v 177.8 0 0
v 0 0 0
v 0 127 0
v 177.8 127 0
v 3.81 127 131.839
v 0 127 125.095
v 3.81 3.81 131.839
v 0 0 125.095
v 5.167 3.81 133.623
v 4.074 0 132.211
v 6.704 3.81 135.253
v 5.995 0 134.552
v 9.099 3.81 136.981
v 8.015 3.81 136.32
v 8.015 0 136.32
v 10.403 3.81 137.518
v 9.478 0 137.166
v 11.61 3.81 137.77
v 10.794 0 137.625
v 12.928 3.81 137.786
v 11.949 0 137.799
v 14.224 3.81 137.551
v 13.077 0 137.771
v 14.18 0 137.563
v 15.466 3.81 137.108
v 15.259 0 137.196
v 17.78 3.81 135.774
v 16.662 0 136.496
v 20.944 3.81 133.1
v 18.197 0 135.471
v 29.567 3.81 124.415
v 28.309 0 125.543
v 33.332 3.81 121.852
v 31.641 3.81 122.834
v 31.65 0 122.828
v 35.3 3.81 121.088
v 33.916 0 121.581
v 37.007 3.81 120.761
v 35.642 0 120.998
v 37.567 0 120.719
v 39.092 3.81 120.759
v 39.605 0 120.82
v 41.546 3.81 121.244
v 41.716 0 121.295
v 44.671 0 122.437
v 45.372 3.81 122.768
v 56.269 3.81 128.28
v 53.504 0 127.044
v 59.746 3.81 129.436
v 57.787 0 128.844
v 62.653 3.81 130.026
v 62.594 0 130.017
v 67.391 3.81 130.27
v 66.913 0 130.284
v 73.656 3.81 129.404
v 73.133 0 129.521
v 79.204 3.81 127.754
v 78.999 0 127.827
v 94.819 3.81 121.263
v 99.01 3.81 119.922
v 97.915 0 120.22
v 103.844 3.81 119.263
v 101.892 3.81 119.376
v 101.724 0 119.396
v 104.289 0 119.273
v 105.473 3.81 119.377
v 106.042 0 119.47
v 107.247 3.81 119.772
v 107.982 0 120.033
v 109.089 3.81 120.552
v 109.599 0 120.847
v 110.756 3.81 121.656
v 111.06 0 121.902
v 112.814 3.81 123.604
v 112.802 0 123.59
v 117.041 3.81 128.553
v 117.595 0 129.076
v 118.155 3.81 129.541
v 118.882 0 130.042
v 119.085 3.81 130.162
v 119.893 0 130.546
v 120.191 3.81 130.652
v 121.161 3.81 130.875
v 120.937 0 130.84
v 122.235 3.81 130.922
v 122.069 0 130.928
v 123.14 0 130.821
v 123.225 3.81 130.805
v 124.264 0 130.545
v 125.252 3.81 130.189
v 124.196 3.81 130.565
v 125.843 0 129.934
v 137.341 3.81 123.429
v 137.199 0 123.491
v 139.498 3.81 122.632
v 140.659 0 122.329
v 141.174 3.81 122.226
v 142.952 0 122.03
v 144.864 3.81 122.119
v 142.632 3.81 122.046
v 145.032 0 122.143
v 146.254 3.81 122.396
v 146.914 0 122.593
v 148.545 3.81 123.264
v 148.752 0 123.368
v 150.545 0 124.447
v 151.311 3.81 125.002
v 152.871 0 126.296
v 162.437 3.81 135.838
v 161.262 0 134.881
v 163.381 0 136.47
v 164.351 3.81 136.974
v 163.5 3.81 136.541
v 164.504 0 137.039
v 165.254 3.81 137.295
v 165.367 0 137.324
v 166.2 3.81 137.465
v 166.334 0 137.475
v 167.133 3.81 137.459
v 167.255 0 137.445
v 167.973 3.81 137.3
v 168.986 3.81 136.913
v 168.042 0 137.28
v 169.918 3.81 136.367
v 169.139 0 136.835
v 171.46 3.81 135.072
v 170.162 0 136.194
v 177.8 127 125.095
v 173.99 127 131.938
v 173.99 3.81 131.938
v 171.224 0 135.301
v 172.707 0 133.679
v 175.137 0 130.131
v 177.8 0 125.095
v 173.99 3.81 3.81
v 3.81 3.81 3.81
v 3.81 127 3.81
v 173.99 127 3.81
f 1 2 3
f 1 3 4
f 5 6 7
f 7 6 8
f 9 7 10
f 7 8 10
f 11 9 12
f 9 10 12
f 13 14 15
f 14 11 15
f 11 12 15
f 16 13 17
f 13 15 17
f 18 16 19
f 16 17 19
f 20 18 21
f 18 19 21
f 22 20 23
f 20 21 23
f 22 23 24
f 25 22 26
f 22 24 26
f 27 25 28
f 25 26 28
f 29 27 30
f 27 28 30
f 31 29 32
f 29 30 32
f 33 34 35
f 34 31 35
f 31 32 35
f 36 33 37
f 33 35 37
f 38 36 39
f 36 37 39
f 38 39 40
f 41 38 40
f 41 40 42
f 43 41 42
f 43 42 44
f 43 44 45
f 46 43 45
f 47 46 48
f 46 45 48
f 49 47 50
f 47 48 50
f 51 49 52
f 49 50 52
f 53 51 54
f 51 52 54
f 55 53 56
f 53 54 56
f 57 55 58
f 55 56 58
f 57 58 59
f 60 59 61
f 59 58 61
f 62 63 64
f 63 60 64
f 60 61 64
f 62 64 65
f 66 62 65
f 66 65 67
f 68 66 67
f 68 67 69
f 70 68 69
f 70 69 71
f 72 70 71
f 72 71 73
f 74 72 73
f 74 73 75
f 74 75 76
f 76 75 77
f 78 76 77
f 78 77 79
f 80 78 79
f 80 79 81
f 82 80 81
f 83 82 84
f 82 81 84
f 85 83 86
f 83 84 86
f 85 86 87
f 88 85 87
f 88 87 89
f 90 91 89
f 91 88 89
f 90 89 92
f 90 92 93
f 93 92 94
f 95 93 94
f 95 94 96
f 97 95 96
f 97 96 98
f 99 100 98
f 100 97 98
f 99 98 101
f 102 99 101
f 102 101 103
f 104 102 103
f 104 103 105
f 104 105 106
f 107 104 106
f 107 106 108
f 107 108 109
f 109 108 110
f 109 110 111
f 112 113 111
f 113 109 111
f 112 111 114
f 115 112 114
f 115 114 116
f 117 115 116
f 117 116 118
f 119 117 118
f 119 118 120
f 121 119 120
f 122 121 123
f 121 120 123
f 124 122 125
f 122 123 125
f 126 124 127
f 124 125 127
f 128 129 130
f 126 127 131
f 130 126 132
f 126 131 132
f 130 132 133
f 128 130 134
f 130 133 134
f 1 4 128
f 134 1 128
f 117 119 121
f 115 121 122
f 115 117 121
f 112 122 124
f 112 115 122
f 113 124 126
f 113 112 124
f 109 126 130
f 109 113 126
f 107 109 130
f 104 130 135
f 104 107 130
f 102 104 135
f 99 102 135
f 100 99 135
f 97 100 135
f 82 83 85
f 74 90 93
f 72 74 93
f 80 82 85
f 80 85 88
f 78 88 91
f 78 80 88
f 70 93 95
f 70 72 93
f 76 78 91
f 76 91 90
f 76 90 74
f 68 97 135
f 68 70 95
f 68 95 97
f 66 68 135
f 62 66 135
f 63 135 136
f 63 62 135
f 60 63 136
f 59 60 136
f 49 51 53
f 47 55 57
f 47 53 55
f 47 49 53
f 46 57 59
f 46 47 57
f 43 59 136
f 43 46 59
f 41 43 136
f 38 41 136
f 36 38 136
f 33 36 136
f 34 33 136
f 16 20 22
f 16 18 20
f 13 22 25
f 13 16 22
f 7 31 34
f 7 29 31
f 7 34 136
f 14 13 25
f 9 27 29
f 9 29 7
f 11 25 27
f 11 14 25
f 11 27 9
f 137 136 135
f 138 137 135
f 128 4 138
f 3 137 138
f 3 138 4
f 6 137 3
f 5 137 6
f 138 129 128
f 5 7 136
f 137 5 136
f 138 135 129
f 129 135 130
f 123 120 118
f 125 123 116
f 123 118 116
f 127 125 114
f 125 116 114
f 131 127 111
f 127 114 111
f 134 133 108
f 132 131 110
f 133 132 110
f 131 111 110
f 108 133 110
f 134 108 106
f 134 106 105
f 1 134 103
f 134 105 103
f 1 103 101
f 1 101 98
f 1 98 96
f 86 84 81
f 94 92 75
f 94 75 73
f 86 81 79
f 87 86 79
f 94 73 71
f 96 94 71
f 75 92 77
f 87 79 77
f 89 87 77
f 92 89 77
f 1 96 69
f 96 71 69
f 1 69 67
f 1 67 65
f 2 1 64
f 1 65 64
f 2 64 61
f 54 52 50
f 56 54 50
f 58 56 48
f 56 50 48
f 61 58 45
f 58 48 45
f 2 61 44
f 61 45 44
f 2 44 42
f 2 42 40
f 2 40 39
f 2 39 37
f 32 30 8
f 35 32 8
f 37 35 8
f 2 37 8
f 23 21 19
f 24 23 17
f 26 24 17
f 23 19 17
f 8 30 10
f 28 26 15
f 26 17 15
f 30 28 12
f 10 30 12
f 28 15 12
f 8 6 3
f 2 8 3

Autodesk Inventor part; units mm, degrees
ref_plane "YZ Plane" through (0, 0, 0) normal (1, 0, 0) x (0, 1, 0)
ref_plane "XZ Plane" through (0, 0, 0) normal (0, 1, 0) x (-1, 0, 0)
ref_plane "XY Plane" through (0, 0, 0) normal (0, 0, 1) x (1, 0, 0)
sketch "Sketch1" plane through (0, 0, 0) normal (0, 1, 0) x (-1, 0, 0)
  line L0 (0, 0) -> (-177.8, 0)
  line L1 (-177.8, 0) -> (-177.8, 254)
  line L2 (-177.8, 254) -> (0, 254)
  line L3 (0, 254) -> (0, 0)
  dimension "d0" = 177.8
  dimension "d1" = 254
extrude "Extrusion1" add sketch "Sketch1" along normal blind 127
shell "Shell1" thickness 3.81 removed faces 1 at (118.5333, 127, 169.3333)
sketch "Sketch2" plane through (0, 0, 254) normal (0, 0, 1) x (1, 0, 0)
  line L0 (0, 0) -> (177.8, 0) projected
  line L1 (177.8, 0) -> (177.8, 127) projected
  line L2 (0, 127) -> (177.8, 127) projected
  line L3 (0, 0) -> (0, 127) projected
extrude "Extrusion2" cut sketch "Sketch2" against normal up to surface (3.81 mm away)
sketch "Sketch3" plane through (3.81, 3.81, 3.81) normal (0, 0, 1) x (1, 0, 0)
  line L0 (170.18, 0) -> (0, 0) projected
  line L1 (170.18, 0) -> (170.18, 123.19) projected
  line L2 (0, 123.19) -> (170.18, 123.19) projected
  line L3 (0, 0) -> (0, 123.19) projected
  point P0 (-3.81, -3.81)
sketch "Sketch4" plane through (0, 0, 0) normal (0, -1, 0) x (1, 0, 0)
  line L0 (0, 0) -> (0, 250.19) projected
  line L1 (177.8, 0) -> (0, 0) projected
  line L2 (177.8, 250.19) -> (177.8, 0) projected
  line L3 (177.8, 250.19) -> (0, 250.19) projected
  line L4 (0, 0) -> (0, 250.19) projected
  line L5 (177.8, 0) -> (0, 0) projected
  line L6 (177.8, 250.19) -> (177.8, 0) projected
  line L7 (177.8, 250.19) -> (177.8, 0) projected
  spline S0 degree 4 poles (0, 125.095) (18.5625, 164.2011) (32.6327, 79.9754) (47.4518, 162.5292) (113.1446, 101.2486) (116.8423, 161.5015) (155.6163, 85.0462) (160.2364, 161.9134) (177.8, 125.095) knots 0 0 0 0 0 0.323542 0.454905 0.586595 0.711733 1 1 1 1 1
  point P0 (22.8108, 131.2197)
  point P1 (39.2238, 120.7725)
  point P2 (67.4765, 130.2672)
  point P3 (109.2766, 120.6567)
  point P4 (120.9714, 130.8461)
  point P5 (139.1504, 122.7409)
  point P6 (157.2136, 130.7303)
extrude "Extrusion3" cut sketch "Sketch4" against normal through all contours L0 L3 L2 S0
properties part number "Component box Bottom tall R"
